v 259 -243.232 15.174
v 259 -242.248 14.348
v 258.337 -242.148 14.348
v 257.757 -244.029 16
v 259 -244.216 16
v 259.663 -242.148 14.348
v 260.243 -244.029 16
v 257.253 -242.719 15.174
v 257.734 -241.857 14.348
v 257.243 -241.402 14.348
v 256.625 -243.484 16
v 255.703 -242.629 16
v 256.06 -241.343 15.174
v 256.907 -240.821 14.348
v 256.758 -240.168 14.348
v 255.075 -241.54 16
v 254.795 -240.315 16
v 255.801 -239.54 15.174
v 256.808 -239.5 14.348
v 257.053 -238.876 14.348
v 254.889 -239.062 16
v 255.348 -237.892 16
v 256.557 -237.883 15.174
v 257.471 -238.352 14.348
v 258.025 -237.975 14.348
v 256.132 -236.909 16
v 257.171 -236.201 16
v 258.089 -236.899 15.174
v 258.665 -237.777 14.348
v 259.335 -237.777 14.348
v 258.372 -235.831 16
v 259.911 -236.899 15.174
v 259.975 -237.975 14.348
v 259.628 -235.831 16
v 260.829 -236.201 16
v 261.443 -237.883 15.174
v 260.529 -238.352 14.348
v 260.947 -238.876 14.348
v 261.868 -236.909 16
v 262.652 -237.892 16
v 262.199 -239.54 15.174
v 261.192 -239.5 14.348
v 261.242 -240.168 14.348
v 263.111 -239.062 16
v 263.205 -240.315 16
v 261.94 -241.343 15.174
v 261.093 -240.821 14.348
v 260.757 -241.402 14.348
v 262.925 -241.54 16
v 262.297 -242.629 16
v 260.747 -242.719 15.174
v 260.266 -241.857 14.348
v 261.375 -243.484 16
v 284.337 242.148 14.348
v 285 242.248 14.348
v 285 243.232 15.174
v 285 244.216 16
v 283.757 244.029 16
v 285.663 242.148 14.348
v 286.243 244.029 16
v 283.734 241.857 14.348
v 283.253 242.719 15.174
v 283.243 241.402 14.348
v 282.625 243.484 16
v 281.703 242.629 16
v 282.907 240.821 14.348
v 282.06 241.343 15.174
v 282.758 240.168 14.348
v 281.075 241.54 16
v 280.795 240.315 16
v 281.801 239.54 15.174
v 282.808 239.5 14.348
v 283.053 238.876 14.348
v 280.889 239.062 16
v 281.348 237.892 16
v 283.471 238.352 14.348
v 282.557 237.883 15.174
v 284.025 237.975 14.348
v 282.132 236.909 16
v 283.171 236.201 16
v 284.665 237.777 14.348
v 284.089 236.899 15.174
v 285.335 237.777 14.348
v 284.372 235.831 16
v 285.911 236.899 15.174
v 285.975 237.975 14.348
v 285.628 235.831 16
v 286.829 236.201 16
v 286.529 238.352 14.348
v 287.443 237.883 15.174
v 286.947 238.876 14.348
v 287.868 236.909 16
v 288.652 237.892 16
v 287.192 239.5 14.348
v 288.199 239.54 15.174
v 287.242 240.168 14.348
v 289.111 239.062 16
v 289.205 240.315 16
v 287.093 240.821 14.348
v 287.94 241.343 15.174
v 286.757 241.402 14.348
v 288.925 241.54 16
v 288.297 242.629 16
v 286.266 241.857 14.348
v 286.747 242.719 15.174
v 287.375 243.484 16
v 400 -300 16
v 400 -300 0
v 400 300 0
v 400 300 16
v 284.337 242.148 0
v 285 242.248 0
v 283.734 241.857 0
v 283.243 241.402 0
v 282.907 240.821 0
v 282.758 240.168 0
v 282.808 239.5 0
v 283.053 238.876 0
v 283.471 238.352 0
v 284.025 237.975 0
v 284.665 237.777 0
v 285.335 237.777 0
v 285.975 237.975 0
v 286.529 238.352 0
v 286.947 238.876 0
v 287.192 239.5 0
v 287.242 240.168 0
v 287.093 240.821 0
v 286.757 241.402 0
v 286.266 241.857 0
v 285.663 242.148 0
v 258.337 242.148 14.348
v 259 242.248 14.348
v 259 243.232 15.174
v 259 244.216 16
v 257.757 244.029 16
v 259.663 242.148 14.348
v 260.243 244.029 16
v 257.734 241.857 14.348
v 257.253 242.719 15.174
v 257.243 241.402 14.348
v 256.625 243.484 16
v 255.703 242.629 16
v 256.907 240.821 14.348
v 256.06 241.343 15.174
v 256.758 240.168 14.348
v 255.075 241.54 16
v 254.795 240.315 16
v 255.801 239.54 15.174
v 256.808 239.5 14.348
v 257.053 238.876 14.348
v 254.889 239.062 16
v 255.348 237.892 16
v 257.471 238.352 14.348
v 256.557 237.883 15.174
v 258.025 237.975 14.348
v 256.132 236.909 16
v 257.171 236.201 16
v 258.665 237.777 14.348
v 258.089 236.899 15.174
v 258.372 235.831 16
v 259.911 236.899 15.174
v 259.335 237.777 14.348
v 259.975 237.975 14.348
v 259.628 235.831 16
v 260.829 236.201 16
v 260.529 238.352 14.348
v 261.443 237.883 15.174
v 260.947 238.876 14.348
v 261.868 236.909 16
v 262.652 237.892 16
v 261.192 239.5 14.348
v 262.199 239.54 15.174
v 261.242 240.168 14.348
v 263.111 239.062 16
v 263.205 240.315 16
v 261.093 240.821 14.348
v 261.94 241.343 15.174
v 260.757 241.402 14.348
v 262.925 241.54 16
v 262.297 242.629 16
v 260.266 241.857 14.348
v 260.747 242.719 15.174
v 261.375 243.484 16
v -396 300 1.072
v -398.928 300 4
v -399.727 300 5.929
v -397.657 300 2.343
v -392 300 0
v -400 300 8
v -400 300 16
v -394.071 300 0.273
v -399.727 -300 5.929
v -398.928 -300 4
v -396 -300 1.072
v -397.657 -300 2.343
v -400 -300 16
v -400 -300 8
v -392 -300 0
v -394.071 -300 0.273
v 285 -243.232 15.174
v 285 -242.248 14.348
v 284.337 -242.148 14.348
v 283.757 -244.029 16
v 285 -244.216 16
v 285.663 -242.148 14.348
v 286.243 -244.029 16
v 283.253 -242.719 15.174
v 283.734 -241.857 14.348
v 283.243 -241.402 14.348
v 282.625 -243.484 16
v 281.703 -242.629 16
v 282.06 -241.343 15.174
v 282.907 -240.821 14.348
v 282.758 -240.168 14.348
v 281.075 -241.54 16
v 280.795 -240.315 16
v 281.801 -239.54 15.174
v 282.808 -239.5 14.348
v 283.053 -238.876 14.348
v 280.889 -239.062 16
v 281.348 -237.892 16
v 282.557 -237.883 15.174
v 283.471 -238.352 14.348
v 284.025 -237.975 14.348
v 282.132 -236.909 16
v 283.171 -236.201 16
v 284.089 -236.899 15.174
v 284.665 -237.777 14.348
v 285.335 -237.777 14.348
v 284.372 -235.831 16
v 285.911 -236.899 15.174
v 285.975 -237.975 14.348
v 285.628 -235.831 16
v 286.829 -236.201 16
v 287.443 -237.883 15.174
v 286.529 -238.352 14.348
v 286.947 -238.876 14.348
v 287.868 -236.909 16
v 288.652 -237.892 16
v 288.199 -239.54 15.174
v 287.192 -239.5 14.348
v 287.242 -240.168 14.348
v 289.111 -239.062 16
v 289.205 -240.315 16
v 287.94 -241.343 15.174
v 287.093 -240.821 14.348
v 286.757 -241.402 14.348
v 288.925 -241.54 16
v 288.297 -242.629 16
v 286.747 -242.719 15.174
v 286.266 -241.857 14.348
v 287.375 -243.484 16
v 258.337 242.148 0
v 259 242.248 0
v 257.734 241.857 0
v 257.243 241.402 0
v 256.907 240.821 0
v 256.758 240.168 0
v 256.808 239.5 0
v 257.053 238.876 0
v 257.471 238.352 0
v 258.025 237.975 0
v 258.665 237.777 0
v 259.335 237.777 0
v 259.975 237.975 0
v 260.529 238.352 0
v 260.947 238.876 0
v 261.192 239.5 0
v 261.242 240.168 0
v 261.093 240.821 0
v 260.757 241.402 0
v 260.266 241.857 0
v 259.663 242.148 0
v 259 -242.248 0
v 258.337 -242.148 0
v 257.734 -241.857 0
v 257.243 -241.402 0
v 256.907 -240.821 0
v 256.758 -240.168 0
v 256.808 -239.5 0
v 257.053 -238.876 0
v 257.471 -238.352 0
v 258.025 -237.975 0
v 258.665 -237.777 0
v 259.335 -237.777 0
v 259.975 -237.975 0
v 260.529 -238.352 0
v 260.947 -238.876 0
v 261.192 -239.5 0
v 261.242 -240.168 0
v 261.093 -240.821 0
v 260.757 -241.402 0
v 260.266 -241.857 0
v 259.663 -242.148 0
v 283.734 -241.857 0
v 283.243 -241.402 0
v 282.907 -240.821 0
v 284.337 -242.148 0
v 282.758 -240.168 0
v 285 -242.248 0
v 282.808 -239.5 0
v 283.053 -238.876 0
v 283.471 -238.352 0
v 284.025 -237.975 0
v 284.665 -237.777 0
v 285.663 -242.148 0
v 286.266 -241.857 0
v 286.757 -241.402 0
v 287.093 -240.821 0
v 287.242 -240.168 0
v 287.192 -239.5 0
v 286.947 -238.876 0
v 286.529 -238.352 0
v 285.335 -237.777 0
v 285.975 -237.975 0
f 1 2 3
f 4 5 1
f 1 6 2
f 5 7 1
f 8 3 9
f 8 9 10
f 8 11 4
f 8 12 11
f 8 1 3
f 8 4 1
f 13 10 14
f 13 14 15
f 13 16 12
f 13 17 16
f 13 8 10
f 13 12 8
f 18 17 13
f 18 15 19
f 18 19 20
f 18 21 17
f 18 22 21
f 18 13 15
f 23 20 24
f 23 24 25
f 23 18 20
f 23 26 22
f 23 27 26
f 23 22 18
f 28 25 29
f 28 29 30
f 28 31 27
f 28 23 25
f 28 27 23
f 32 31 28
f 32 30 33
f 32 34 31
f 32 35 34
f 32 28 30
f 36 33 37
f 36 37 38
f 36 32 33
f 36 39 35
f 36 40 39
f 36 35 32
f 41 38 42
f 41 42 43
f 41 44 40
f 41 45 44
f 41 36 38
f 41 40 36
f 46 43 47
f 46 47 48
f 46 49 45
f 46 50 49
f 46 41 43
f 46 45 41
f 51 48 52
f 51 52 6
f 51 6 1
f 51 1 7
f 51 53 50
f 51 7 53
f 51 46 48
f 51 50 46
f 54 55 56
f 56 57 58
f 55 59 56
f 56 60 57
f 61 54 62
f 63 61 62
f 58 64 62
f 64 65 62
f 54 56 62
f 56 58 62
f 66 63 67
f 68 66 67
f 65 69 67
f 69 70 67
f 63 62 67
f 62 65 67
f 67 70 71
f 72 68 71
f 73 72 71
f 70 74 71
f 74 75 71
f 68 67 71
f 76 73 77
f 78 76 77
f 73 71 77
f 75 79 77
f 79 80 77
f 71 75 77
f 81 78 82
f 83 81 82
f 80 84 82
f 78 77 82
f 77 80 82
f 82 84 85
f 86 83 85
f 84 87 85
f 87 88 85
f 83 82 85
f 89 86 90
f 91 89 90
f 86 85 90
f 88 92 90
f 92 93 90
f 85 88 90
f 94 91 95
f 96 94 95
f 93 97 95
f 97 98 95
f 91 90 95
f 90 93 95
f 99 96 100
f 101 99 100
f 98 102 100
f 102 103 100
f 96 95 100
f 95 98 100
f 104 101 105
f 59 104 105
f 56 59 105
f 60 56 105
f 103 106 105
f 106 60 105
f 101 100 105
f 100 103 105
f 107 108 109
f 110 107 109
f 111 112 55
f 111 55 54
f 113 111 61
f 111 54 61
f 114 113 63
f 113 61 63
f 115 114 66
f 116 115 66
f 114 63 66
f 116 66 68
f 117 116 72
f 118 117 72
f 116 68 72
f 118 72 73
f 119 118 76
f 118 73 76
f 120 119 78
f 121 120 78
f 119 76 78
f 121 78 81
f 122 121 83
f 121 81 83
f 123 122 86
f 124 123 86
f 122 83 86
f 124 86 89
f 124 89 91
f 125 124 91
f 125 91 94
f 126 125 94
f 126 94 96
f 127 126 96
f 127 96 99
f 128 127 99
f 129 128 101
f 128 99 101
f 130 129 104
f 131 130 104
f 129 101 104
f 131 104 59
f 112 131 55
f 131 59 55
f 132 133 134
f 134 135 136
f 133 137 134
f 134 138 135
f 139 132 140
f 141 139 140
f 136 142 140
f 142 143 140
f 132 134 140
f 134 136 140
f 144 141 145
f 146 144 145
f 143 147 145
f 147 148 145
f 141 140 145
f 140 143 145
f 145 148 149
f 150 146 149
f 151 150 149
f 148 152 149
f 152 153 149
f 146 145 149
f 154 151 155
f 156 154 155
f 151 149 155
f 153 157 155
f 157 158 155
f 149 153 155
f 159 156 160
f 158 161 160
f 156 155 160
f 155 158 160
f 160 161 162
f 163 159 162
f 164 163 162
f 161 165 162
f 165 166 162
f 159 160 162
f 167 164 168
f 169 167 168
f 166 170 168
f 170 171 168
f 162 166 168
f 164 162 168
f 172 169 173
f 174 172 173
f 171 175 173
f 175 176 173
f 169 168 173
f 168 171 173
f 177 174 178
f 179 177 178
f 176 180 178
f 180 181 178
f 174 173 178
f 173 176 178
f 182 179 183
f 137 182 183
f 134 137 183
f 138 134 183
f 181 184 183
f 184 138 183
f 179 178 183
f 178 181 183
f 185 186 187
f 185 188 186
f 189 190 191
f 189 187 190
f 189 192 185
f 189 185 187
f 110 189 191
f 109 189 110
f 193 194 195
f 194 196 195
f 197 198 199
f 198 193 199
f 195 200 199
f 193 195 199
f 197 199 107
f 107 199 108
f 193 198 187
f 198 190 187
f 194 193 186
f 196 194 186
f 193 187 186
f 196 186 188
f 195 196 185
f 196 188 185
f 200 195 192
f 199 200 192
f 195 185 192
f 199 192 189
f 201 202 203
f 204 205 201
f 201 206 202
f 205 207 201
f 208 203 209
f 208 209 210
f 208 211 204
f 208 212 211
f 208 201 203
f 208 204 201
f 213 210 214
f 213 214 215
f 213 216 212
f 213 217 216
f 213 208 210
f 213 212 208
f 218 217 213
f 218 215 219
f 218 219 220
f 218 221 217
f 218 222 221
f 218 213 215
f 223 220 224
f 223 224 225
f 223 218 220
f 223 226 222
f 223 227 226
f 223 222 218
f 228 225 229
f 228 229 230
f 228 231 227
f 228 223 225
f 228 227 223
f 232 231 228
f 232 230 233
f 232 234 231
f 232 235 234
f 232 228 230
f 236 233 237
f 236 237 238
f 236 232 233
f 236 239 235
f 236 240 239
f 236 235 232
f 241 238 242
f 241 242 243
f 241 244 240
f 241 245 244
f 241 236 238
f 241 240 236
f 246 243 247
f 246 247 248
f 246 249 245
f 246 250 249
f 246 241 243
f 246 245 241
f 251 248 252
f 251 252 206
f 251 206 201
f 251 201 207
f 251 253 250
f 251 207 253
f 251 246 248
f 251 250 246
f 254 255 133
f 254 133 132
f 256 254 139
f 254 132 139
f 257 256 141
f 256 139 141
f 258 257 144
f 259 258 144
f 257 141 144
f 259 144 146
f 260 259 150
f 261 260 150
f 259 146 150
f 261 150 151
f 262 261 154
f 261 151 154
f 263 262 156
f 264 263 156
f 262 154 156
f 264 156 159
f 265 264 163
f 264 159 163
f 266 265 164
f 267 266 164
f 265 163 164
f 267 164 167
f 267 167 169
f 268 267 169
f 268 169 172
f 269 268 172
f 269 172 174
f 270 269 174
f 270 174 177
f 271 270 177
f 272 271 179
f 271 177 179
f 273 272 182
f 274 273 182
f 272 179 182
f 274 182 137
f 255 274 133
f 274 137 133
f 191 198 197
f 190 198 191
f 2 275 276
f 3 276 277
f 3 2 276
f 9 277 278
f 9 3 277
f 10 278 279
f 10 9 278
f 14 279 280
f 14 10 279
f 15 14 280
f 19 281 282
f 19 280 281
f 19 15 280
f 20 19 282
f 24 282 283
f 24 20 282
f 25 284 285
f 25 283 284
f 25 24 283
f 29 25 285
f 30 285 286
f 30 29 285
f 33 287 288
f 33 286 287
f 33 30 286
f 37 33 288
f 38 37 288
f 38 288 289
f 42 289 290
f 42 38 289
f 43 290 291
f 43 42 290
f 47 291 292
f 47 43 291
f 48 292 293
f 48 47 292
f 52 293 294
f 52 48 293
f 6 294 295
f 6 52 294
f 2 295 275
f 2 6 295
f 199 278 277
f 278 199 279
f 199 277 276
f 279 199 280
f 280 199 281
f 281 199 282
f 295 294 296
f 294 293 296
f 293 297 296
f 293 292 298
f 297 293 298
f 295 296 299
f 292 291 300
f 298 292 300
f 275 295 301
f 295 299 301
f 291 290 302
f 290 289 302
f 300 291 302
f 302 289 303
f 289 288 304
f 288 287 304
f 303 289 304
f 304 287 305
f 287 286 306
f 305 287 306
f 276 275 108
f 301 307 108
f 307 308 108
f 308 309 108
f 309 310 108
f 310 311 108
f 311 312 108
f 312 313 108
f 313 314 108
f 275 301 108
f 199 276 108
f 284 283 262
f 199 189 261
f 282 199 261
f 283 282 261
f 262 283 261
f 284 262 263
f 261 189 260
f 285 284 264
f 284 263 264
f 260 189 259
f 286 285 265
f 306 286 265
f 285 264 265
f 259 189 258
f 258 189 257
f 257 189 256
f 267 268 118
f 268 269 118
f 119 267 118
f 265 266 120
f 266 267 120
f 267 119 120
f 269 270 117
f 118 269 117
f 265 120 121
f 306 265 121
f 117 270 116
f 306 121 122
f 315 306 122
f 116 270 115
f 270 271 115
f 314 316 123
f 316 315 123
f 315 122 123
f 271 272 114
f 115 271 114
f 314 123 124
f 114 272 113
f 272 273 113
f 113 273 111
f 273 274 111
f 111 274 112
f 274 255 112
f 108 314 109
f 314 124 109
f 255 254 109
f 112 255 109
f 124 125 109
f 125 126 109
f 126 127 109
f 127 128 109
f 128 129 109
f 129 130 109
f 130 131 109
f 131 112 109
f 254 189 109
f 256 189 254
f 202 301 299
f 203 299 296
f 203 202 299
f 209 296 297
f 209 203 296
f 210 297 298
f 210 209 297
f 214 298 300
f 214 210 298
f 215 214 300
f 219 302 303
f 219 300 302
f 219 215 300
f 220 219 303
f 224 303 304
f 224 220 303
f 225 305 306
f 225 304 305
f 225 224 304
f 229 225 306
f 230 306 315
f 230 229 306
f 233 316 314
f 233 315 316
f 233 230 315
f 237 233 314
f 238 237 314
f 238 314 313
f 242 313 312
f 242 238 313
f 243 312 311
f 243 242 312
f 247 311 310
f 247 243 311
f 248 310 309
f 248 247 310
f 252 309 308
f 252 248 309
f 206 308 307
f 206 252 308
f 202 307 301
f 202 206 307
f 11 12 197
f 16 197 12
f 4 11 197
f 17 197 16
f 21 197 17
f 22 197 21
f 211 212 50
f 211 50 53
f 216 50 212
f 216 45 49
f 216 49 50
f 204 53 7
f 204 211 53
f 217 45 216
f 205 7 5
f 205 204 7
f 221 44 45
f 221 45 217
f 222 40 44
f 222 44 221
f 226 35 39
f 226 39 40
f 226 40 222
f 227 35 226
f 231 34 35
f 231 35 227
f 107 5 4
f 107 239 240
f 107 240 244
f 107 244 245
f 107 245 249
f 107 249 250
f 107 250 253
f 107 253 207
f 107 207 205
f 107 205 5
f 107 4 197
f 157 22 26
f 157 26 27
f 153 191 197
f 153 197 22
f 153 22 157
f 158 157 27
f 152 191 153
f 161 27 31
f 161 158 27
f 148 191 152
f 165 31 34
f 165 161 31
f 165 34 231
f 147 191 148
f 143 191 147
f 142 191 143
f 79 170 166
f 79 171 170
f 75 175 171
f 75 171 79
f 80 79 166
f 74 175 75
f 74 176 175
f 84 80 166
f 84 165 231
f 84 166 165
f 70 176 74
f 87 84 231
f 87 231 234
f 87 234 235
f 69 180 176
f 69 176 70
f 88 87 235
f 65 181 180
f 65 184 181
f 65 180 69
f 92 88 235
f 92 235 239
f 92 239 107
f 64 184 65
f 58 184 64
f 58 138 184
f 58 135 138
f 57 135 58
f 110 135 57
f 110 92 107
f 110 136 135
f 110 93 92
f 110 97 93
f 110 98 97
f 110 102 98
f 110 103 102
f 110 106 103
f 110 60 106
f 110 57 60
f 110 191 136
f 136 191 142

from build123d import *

# Parameters (mm, degrees)
SKETCH1_W                                 = 800
SKETCH1_H                                 = 600
BOSS_EXTRUDE1_DEPTH                       = 16
CSK_FOR_8_FLAT_HEAD_MACHINE_SCREW_2_COUNT = 2
CSK_FOR_8_FLAT_HEAD_MACHINE_SCREW_2_PITCH = 26
FILLET1_R                                 = 8


with BuildPart() as part:
    # Sketch1 → Boss-Extrude1 (new body)
    with BuildSketch(Plane.XY):
        Rectangle(SKETCH1_W, SKETCH1_H)
    extrude(amount=BOSS_EXTRUDE1_DEPTH)

    # Sketch3 → CSK for #8 Flat Head Machine Screw (100)1 (revolve, cut)
    with BuildSketch(Plane(origin=(285, -240, 16), x_dir=(0, -1, 0), z_dir=(1, 0, 0))):
        Polygon((0, 0), (0, 26.350674586), (2.2479, 25), (2.2479, 1.651767624), (4.2164, 0), align=None)
    csk_for_8_flat_head_machine_screw_100 = revolve(axis=Axis((285, -240, 22.35), (0, 0, -1)), mode=Mode.SUBTRACT)

    # CSK for _8 Flat Head Machine Screw _ 2: CSK for #8 Flat Head Machine Screw (100)1 ×2
    with Locations(*[(-i * CSK_FOR_8_FLAT_HEAD_MACHINE_SCREW_2_PITCH, 0, 0) for i in range(1, CSK_FOR_8_FLAT_HEAD_MACHINE_SCREW_2_COUNT)]):
        add(csk_for_8_flat_head_machine_screw_100, mode=Mode.SUBTRACT)

    # Mirror1: CSK for #8 Flat Head Machine Screw (100)1 across plane
    add(csk_for_8_flat_head_machine_screw_100.mirror(Plane.ZX), mode=Mode.SUBTRACT)

    # Mirror1 copy 1 sketch → Mirror1 copy 1 (revolve, cut)
    with BuildSketch(Plane(origin=(259, 240, 16), x_dir=(0, 1, 0), z_dir=(1, 0, 0))):
        Polygon((0, 0), (0, -26.350674586), (2.2479, -25), (2.2479, -1.651767624), (4.2164, 0), align=None)
    revolve(axis=Axis((259, 240, 22.35), (0, 0, 1)), mode=Mode.SUBTRACT)

    # Fillet1
    fillet1_edges = [part.edges().sort_by_distance(p)[0] for p in [
        (-400, 0, 0),
    ]]
    fillet(fillet1_edges, radius=FILLET1_R)


solid = part.part
